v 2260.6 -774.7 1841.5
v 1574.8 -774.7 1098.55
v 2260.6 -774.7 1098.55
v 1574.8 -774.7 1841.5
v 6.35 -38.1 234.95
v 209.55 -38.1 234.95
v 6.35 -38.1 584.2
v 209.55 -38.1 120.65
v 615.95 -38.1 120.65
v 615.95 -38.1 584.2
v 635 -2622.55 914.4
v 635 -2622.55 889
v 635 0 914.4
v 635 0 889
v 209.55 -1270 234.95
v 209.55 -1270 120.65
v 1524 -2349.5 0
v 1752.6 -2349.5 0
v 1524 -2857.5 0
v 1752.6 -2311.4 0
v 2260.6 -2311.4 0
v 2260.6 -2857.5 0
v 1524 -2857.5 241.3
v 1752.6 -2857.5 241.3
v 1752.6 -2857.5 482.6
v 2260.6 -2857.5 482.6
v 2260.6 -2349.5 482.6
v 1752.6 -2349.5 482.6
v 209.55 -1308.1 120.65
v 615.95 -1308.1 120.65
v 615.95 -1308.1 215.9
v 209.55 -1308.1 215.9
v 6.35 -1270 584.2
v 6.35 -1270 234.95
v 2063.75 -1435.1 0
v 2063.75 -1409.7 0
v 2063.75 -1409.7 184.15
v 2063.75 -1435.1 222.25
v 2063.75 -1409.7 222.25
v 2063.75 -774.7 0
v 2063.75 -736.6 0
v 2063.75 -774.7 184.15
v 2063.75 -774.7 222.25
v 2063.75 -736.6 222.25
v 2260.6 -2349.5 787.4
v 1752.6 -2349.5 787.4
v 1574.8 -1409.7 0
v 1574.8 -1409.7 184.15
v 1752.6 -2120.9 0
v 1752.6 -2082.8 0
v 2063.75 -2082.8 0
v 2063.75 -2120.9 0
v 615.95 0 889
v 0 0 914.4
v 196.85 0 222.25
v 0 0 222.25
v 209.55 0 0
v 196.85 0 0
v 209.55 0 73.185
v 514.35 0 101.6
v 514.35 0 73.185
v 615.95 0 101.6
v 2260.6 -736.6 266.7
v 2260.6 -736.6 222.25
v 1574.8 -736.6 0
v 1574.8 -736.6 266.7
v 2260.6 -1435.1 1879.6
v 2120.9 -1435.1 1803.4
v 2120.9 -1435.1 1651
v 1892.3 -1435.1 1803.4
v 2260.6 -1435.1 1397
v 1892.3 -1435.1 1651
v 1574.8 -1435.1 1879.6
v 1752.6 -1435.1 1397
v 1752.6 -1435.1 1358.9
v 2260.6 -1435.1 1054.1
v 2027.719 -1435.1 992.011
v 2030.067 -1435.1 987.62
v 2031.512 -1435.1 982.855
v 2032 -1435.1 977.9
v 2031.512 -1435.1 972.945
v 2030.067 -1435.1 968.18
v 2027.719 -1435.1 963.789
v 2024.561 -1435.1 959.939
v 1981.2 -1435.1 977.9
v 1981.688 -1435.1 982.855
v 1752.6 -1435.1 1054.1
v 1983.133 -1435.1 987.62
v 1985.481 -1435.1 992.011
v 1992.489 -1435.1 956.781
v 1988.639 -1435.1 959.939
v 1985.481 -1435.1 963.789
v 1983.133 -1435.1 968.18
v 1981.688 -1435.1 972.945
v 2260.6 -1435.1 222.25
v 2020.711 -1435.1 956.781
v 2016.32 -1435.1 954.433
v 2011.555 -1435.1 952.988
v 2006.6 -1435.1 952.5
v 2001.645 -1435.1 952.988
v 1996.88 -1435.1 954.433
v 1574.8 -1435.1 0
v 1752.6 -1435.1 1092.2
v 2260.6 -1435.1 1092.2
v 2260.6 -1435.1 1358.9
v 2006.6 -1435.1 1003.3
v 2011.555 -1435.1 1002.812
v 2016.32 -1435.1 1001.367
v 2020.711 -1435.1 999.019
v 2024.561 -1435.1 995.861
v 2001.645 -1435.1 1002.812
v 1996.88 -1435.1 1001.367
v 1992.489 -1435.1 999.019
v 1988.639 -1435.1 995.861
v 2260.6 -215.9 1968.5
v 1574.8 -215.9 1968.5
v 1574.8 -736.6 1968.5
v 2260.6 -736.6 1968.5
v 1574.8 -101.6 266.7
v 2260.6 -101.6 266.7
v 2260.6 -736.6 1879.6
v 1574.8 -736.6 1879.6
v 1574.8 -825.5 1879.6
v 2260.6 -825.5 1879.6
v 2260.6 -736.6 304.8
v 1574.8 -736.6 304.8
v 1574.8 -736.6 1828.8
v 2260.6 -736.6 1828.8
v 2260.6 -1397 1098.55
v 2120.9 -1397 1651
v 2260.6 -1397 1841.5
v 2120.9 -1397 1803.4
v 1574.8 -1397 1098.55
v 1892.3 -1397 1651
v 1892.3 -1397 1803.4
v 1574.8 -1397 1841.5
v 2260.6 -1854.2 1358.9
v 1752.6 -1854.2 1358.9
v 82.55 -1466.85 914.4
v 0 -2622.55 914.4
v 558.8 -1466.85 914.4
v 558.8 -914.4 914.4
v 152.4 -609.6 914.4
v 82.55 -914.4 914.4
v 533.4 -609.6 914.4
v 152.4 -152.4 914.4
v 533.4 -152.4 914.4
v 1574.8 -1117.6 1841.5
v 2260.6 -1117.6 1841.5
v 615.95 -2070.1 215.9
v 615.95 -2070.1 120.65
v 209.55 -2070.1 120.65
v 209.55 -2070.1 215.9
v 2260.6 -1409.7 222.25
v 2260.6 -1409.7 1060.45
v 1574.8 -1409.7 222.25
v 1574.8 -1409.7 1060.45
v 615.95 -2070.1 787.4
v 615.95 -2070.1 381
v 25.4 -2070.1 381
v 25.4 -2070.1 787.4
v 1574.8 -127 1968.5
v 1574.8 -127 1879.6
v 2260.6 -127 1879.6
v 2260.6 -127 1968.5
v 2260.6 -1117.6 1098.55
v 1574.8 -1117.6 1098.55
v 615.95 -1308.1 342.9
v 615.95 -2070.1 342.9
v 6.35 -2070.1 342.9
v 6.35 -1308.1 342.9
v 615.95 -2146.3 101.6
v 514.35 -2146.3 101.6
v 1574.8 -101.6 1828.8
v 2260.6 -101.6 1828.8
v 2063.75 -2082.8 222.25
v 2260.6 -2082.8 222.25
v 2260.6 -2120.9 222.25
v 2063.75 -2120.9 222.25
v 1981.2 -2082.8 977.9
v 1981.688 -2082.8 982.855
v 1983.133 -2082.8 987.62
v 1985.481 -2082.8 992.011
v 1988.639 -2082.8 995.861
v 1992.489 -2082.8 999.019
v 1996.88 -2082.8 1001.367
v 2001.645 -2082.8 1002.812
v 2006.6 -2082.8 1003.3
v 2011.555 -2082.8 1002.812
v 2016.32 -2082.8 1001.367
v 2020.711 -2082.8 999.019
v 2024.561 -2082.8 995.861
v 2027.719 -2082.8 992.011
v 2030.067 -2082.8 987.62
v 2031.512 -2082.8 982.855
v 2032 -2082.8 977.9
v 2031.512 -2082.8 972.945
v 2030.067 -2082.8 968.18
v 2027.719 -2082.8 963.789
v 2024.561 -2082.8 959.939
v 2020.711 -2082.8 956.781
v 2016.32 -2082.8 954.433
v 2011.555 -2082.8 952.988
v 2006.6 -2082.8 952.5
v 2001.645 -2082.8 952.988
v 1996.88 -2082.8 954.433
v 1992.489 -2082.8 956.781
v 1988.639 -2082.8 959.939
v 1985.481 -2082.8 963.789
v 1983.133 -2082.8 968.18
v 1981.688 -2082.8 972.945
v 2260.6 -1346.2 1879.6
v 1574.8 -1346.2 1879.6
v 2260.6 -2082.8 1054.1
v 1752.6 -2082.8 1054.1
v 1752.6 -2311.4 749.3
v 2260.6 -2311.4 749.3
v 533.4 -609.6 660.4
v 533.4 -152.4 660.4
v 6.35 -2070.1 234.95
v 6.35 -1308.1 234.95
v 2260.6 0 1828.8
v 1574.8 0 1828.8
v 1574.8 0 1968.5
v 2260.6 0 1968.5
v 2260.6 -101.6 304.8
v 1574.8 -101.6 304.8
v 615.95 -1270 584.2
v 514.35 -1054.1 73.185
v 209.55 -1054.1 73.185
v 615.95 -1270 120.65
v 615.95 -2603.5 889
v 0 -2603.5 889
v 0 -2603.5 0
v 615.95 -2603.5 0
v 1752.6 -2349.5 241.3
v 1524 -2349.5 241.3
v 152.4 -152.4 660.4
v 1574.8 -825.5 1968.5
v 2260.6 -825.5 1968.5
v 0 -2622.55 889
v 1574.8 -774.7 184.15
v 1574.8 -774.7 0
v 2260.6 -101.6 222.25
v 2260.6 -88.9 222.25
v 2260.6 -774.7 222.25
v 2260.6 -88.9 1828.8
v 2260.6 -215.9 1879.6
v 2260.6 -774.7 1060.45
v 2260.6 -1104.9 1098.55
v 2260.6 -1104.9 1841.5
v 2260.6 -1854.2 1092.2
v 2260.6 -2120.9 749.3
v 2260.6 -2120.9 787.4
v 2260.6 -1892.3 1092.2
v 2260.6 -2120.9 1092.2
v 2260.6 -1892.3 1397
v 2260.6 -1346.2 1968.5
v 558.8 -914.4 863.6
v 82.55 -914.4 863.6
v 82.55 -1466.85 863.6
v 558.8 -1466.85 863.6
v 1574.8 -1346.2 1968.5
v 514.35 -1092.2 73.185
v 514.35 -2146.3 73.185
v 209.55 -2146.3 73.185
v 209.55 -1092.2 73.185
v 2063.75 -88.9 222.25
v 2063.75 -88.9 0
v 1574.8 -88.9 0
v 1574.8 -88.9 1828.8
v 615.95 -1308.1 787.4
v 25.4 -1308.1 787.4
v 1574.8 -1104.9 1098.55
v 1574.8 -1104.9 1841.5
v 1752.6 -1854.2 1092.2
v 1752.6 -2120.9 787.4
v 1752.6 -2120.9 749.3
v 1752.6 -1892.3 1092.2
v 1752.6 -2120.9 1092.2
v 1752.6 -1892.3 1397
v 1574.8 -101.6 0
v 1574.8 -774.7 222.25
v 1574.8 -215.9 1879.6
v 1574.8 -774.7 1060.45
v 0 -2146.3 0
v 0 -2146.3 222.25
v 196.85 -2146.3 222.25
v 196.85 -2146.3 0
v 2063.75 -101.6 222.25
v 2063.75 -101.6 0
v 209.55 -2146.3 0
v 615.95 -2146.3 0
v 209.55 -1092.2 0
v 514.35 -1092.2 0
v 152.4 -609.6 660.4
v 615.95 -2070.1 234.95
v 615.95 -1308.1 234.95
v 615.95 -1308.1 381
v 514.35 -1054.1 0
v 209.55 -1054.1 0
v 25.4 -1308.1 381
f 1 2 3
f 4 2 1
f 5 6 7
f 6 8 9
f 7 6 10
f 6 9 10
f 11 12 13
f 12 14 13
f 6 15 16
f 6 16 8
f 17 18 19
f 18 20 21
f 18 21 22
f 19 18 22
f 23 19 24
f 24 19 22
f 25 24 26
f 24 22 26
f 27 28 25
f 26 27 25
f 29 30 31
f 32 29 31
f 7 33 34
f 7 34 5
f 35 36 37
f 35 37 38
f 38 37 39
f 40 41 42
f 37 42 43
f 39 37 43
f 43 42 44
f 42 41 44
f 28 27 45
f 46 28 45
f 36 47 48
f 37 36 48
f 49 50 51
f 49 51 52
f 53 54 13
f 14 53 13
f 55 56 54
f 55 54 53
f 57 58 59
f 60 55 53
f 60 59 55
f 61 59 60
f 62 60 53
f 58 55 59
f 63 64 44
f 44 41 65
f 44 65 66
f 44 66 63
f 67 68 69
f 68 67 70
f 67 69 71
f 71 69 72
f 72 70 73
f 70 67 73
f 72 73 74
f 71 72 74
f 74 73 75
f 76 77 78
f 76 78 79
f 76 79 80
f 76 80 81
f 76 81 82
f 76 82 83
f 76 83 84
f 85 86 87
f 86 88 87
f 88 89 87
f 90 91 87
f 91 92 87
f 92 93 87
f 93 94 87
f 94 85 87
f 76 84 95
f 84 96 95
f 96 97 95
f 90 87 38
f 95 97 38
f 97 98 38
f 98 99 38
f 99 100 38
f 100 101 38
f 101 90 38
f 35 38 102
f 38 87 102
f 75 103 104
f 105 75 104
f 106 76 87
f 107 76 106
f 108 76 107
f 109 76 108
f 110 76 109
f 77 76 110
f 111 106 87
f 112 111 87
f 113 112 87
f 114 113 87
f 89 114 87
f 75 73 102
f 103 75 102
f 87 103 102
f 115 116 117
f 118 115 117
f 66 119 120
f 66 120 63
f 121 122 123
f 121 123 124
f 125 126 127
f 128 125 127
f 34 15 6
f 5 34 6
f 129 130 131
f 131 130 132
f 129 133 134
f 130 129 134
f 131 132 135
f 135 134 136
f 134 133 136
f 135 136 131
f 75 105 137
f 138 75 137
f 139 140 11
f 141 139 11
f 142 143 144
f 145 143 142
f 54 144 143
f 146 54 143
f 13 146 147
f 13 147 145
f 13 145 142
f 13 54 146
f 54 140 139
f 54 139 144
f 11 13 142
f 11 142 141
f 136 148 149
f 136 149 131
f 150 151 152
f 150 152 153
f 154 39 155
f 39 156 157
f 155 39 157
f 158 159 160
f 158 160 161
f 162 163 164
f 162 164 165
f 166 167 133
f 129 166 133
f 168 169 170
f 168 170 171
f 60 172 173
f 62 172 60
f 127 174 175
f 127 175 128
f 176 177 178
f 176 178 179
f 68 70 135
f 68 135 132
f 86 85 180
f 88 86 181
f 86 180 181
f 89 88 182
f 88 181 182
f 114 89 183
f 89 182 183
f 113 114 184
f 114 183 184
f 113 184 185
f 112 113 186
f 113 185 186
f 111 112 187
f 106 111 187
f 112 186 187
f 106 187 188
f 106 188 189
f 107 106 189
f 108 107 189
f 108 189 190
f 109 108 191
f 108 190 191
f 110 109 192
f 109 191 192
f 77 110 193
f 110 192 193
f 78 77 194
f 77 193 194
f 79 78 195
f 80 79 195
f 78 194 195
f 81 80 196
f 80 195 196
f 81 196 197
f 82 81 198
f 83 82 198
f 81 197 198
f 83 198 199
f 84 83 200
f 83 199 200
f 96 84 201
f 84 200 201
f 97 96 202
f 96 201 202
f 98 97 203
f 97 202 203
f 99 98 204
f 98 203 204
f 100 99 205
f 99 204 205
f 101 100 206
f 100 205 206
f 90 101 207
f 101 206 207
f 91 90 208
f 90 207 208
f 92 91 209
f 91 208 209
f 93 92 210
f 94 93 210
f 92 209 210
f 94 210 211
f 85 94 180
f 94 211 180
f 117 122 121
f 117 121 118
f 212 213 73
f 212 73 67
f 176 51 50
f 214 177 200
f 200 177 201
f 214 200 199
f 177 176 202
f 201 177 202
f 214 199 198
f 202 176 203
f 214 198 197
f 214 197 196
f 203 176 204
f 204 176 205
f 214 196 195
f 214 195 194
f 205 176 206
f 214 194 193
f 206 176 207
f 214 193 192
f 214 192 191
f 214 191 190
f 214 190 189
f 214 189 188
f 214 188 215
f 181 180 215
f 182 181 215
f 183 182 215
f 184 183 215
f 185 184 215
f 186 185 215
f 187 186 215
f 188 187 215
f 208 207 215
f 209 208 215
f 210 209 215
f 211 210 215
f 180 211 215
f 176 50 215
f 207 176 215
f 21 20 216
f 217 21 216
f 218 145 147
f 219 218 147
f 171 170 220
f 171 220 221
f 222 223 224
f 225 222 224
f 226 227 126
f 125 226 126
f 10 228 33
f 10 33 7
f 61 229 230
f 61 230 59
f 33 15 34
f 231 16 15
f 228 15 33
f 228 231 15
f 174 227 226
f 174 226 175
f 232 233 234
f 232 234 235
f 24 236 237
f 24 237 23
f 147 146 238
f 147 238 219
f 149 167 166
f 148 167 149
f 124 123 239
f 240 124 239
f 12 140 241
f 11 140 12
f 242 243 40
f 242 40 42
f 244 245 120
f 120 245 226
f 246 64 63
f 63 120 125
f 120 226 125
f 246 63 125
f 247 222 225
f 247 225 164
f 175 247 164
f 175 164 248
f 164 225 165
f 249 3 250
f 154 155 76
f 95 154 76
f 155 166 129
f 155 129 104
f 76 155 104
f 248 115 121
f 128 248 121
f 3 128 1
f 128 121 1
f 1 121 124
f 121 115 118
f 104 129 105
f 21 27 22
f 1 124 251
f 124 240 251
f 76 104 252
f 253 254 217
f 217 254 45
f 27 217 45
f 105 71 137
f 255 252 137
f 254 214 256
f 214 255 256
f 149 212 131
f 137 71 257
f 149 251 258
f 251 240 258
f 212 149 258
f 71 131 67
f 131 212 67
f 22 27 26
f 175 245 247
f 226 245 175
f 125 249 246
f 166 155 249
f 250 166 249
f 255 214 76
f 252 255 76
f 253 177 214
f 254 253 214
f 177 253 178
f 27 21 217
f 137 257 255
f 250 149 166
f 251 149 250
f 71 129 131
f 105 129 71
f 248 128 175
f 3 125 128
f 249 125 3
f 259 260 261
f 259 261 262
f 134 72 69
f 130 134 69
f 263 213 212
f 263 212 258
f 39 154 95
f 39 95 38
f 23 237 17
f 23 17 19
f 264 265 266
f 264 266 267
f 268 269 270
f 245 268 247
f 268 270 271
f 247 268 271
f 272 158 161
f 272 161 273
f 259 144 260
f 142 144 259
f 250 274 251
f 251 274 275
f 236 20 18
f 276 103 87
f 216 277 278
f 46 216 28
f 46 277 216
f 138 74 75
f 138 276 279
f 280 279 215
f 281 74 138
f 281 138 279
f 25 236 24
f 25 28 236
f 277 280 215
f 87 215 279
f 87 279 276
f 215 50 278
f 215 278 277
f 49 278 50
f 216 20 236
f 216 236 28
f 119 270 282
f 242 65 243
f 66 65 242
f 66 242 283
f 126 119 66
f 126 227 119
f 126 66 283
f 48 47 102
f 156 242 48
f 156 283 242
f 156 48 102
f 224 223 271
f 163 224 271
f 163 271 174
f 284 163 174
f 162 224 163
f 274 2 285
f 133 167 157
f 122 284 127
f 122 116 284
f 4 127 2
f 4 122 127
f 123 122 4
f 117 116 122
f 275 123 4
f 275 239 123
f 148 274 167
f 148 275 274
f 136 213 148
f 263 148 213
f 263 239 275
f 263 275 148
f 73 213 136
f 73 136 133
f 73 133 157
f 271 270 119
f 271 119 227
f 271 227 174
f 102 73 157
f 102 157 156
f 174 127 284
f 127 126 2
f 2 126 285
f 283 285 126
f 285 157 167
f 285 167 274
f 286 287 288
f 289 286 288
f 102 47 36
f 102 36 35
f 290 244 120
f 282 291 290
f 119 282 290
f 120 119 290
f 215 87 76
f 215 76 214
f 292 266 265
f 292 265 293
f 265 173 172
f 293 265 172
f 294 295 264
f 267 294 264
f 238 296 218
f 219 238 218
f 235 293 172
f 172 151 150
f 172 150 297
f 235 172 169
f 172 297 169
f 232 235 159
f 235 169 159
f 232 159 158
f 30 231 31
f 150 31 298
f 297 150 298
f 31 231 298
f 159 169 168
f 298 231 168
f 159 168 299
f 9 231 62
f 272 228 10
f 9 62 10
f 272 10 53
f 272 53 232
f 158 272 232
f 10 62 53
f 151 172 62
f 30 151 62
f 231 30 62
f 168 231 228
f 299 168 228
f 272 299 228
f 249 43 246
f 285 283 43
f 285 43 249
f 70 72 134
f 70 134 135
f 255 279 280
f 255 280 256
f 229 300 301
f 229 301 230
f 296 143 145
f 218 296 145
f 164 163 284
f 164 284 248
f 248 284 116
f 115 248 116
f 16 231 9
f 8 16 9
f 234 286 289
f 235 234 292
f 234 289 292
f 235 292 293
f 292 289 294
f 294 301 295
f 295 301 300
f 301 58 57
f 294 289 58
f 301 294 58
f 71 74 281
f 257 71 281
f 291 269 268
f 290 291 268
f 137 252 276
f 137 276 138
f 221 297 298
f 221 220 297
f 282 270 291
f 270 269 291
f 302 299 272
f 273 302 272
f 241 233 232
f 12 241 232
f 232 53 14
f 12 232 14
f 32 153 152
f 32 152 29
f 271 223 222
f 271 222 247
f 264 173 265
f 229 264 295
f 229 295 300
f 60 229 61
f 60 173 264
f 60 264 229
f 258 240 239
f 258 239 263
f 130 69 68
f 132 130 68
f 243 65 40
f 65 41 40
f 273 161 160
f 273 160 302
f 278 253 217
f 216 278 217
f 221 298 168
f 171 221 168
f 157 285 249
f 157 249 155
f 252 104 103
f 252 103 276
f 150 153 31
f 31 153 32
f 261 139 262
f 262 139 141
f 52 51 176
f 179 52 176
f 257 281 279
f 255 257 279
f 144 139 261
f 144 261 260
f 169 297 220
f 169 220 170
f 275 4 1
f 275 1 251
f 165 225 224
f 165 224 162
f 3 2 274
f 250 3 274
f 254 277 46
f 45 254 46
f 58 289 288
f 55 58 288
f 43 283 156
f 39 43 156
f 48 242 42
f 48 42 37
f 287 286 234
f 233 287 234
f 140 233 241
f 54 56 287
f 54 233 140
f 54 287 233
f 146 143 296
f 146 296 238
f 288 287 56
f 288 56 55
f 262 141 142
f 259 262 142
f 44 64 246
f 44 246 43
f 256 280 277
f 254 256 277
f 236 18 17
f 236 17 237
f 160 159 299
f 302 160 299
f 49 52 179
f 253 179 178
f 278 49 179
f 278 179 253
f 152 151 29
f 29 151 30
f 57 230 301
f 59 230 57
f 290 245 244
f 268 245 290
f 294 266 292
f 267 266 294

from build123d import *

# Parameters (mm, degrees)
F0_W      = 635
F0_H      = 2146.3
F1_DEPTH  = 914.4
F2_W      = 196.85
F2_H      = 222.25
F3_DEPTH  = 2260.6
F4_W      = 19.05
F4_H      = 2146.3
F5_DEPTH  = 889
F7_W      = 476.25
F7_H      = 552.45
F8_DEPTH  = 50.8
F9_W      = 762
F9_H      = 406.4
F10_DEPTH = 609.6
F11_W     = 381
F11_H     = 457.2
F12_DEPTH = 254
F13_W     = 2146.3
F13_H     = 101.6
F14_DEPTH = 101.6
F15_W     = 762
F15_H     = 222.25
F15_W_2   = 1231.9
F15_H_2   = 463.55
F16_DEPTH = 406.4
F17_W     = 762
F17_H     = 107.95
F17_W_2   = 1231.9
F17_H_2   = 349.25
F18_DEPTH = 203.2
F19_W     = 762
F19_H     = 19.05
F20_DEPTH = 406.4
F21_W     = 1054.1
F21_H     = 73.185064
F22_DEPTH = 304.8
F23_W     = 685.8
F23_H     = 2146.3
F24_DEPTH = 1879.6
F26_DEPTH = 457.2
F27_W     = 635
F27_H     = 25.4
F28_DEPTH = 19.05
F29_W     = 635
F29_H     = 1524
F30_DEPTH = 685.801
F31_W     = 196.85
F31_H     = 222.25
F32_DEPTH = 2622.551
F33_W     = 88.9
F33_H     = 1828.8
F34_DEPTH = 685.801
F36_DEPTH = 685.801
F37_W     = 685.8
F37_H     = 1092.2
F38_DEPTH = 711.2
F39_W     = 508
F39_H     = 304.8
F40_DEPTH = 685.801
F41_W     = 635
F41_H     = 838.2
F42_DEPTH = 685.801
F44_DEPTH = 177.8
F45_W     = 508
F45_H     = 241.3
F46_DEPTH = 228.6
F47_W     = 279.4
F47_H     = 742.95
F47_W_2   = 330.2
F48_DEPTH = 685.801
F49_W     = 228.6
F49_H     = 152.4
F50_DEPTH = 38.1
F51_W     = 190.5
F51_H     = 749.3
F51_W_2   = 647.7
F51_H_2   = 1054.1
F51_W_3   = 419.1
F51_H_3   = 266.7
F52_DEPTH = 508.001
F53_R     = 25.4
F54_DEPTH = 647.7
F55_W     = 635
F55_H     = 266.7
F55_H_2   = 184.15
F56_DEPTH = 685.801
F57_W     = 520.7
F57_H     = 88.9
F57_W_2   = 127
F58_DEPTH = 685.8


with BuildPart() as f1:
    # F0 (on Top) → F1 (new body)
    with BuildSketch(Plane.XY):
        with Locations((317.5, -1073.15)):
            Rectangle(F0_W, F0_H)
    extrude(amount=F1_DEPTH)

    # F2 (on face) → F3 (cut)
    with BuildSketch(Plane.XZ.offset(2146.3)):
        with Locations((98.425, 111.125)):
            Rectangle(F2_W, F2_H)
    extrude(amount=-F3_DEPTH, mode=Mode.SUBTRACT)

    # F4 (on face) → F5 (cut)
    with BuildSketch(Plane(origin=(0, 0, 0), x_dir=(1, 0, 0), z_dir=(0, 0, -1))):
        with Locations((625.475, 1073.15)):
            Rectangle(F4_W, F4_H)
    extrude(amount=-F5_DEPTH, mode=Mode.SUBTRACT)

    # F7 (on face) → F8 (cut)
    with BuildSketch(Plane.XY.offset(914.4)):
        with Locations((320.675, -1190.625)):
            Rectangle(F7_W, F7_H)
    extrude(amount=-F8_DEPTH, mode=Mode.SUBTRACT)

    # F9 (on face) → F10 (cut)
    with BuildSketch(Plane.YZ.offset(635)):
        with Locations((-1689.1, 584.2)):
            Rectangle(F9_W, F9_H)
    extrude(amount=-F10_DEPTH, mode=Mode.SUBTRACT)

    # F11 (on face) → F12 (cut)
    with BuildSketch(Plane.XY.offset(914.4)):
        with Locations((342.9, -381)):
            Rectangle(F11_W, F11_H)
    extrude(amount=-F12_DEPTH, mode=Mode.SUBTRACT)

    # F13 (on face) → F14 (cut)
    with BuildSketch(Plane.YZ.offset(615.95)):
        with Locations((-1073.15, 50.8)):
            Rectangle(F13_W, F13_H)
    extrude(amount=-F14_DEPTH, mode=Mode.SUBTRACT)

    # F15 (on face) → F16 (cut)
    with BuildSketch(Plane.YZ.offset(615.95)):
        with Locations((-1689.1, 231.775)):
            Rectangle(F15_W, F15_H)
        with Locations((-654.05, 352.425)):
            Rectangle(F15_W_2, F15_H_2)
    extrude(amount=-F16_DEPTH, mode=Mode.SUBTRACT)

    # F17 (on face) → F18 (cut)
    with BuildSketch(Plane.YZ.offset(209.55)):
        with Locations((-1689.1, 288.925)):
            Rectangle(F17_W, F17_H)
        with Locations((-654.05, 409.575)):
            Rectangle(F17_W_2, F17_H_2)
    extrude(amount=-F18_DEPTH, mode=Mode.SUBTRACT)

    # F19 (on face) → F20 (join, through all)
    with BuildSketch(Plane.YZ.offset(209.55)):
        with Locations((-1689.1, 225.425)):
            Rectangle(F19_W, F19_H)
    extrude(amount=F20_DEPTH)

    # F21 (on face) → F22 (cut)
    with BuildSketch(Plane.YZ.offset(514.35)):
        with Locations((-1619.25, 36.592532)):
            Rectangle(F21_W, F21_H)
        with Locations((-527.05, 36.592532)):
            Rectangle(F21_W, F21_H)
    extrude(amount=-F22_DEPTH, mode=Mode.SUBTRACT)

    # F25 (on face) → F26 (join)
    with BuildSketch(Plane.XZ.offset(2146.3)):
        Polygon((635, 914.4), (0, 914.4), (0, 0), (615.95, 0), (615.95, 889), (635, 889), align=None)
    extrude(amount=F26_DEPTH)

    # F27 (on face) → F28 (join)
    with BuildSketch(Plane.XZ.offset(2603.5)):
        with Locations((317.5, 901.7)):
            Rectangle(F27_W, F27_H)
    extrude(amount=F28_DEPTH)


with BuildPart() as f24:
    # F23 (on Top) → F24 (new body)
    with BuildSketch(Plane.XY):
        with Locations((1917.7, -1073.15)):
            Rectangle(F23_W, F23_H)
    extrude(amount=F24_DEPTH)

    # F29 (on face) → F30 (cut, through all)
    with BuildSketch(Plane(origin=(1574.8, 0, 0), x_dir=(0, -1, 0), z_dir=(-1, 0, 0))):
        with Locations((419.1, 1066.8)):
            Rectangle(F29_W, F29_H)
    extrude(amount=-F30_DEPTH, mode=Mode.SUBTRACT)

    # F31 (on face) → F32 (cut, through all)
    with BuildSketch(Plane(origin=(0, 0, 0), x_dir=(-1, 0, 0), z_dir=(0, 1, 0))):
        with Locations((-2162.175, 111.125)):
            Rectangle(F31_W, F31_H)
    extrude(amount=-F32_DEPTH, mode=Mode.SUBTRACT)

    # F33 (on face) → F34 (cut, through all)
    with BuildSketch(Plane(origin=(1574.8, 0, 0), x_dir=(0, -1, 0), z_dir=(-1, 0, 0))):
        with Locations((44.45, 914.4)):
            Rectangle(F33_W, F33_H)
    extrude(amount=-F34_DEPTH, mode=Mode.SUBTRACT)

    # F35 (on face) → F36 (cut, through all)
    with BuildSketch(Plane(origin=(1574.8, 0, 0), x_dir=(0, -1, 0), z_dir=(-1, 0, 0))):
        Polygon((1435.1, 1397), (1892.3, 1397), (1892.3, 1092.2), (2146.3, 1092.2), (2146.3, 2006.6), (1435.1, 2006.6), align=None)
    extrude(amount=-F36_DEPTH, mode=Mode.SUBTRACT)

    # F37 (on face) → F38 (join)
    with BuildSketch(Plane.XZ.offset(2146.3)):
        with Locations((1917.7, 546.1)):
            Rectangle(F37_W, F37_H)
    extrude(amount=F38_DEPTH)

    # F39 (on face) → F40 (cut, through all)
    with BuildSketch(Plane(origin=(1574.8, 0, 0), x_dir=(0, -1, 0), z_dir=(-1, 0, 0))):
        Polygon((2857.5, 787.4), (2857.5, 1092.2), (2120.9, 1092.2), (2120.9, 787.4), (2349.5, 787.4), align=None)
        with Locations((2603.5, 635)):
            Rectangle(F39_W, F39_H)
    extrude(amount=-F40_DEPTH, mode=Mode.SUBTRACT)

    # F41 (on face) → F42 (cut, through all)
    with BuildSketch(Plane(origin=(1574.8, 0, 0), x_dir=(0, -1, 0), z_dir=(-1, 0, 0))):
        with Locations((1092.2, 641.35)):
            Rectangle(F41_W, F41_H)
    extrude(amount=-F42_DEPTH, mode=Mode.SUBTRACT)

    # F43 (on face) → F44 (cut)
    with BuildSketch(Plane(origin=(1574.8, 0, 0), x_dir=(0, -1, 0), z_dir=(-1, 0, 0))):
        Polygon((2120.9, 1092.2), (1892.3, 1092.2), (1892.3, 1397), (1435.1, 1397), (1435.1, 0), (2857.5, 0), (2857.5, 482.6), (2349.5, 482.6), (2349.5, 787.4), (2120.9, 787.4), align=None)
    extrude(amount=-F44_DEPTH, mode=Mode.SUBTRACT)

    # F45 (on face) → F46 (join)
    with BuildSketch(Plane(origin=(1752.6, 0, 0), x_dir=(0, -1, 0), z_dir=(-1, 0, 0))):
        with Locations((2603.5, 120.65)):
            Rectangle(F45_W, F45_H)
    extrude(amount=F46_DEPTH)

    # F47 (on face) → F48 (cut, through all)
    with BuildSketch(Plane(origin=(1574.8, 0, 0), x_dir=(0, -1, 0), z_dir=(-1, 0, 0))):
        with Locations((1257.3, 1470.025)):
            Rectangle(F47_W, F47_H)
        with Locations((939.8, 1470.025)):
            Rectangle(F47_W_2, F47_H)
    extrude(amount=-F48_DEPTH, mode=Mode.SUBTRACT)

    # F49 (on face) → F50 (cut, through all)
    with BuildSketch(Plane.XZ.offset(1435.1)):
        with Locations((2006.6, 1727.2)):
            Rectangle(F49_W, F49_H)
    extrude(amount=-F50_DEPTH, mode=Mode.SUBTRACT)

    # F51 (on face) → F52 (cut, through all)
    with BuildSketch(Plane(origin=(1752.6, 0, 0), x_dir=(0, -1, 0), z_dir=(-1, 0, 0))):
        with Locations((2216.15, 374.65)):
            Rectangle(F51_W, F51_H)
        with Locations((1758.95, 527.05)):
            Rectangle(F51_W_2, F51_H_2)
        with Locations((1644.65, 1225.55)):
            Rectangle(F51_W_3, F51_H_3)
    extrude(amount=-F52_DEPTH, mode=Mode.SUBTRACT)

    # F53 (on face) → F54 (join, through all)
    with BuildSketch(Plane(origin=(0, -2082.8, 0), x_dir=(-1, 0, 0), z_dir=(0, 1, 0))):
        with Locations((-2006.6, 977.9)):
            Circle(F53_R)
    extrude(amount=F54_DEPTH)

    # F55 (on face) → F56 (cut, through all)
    with BuildSketch(Plane(origin=(1574.8, 0, 0), x_dir=(0, -1, 0), z_dir=(-1, 0, 0))):
        with Locations((419.1, 133.35)):
            Rectangle(F55_W, F55_H)
        with Locations((1092.2, 92.075)):
            Rectangle(F55_W, F55_H_2)
    extrude(amount=-F56_DEPTH, mode=Mode.SUBTRACT)

    # F57 (on face) → F58 (join, through all)
    with BuildSketch(Plane(origin=(1574.8, 0, 0), x_dir=(0, -1, 0), z_dir=(-1, 0, 0))):
        with Locations((1085.85, 1924.05)):
            Rectangle(F57_W, F57_H)
        with Locations((476.25, 1924.05)):
            Rectangle(F57_W, F57_H)
        with Locations((63.5, 1924.05)):
            Rectangle(F57_W_2, F57_H)
    extrude(amount=-F58_DEPTH)


solid = Compound([f1.part, f24.part])
